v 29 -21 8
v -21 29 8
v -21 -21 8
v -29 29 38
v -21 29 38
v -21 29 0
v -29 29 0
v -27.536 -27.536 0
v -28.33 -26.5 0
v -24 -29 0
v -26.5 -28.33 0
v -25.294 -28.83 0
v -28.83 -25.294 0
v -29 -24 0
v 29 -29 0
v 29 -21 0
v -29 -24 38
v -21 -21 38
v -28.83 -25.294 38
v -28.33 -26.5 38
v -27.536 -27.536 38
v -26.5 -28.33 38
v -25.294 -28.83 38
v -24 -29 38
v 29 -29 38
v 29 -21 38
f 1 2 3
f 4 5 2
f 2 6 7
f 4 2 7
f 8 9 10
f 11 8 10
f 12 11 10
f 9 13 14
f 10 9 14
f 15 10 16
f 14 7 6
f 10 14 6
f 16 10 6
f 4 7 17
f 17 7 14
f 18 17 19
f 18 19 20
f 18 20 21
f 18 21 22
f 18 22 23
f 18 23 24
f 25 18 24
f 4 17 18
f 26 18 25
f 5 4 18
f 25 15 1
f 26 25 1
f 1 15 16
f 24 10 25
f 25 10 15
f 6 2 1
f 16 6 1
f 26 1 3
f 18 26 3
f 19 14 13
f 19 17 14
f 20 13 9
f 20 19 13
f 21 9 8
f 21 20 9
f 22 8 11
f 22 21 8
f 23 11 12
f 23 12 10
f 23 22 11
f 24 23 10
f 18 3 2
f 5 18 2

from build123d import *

# Parameters (mm, degrees)
F0_W     = 58
F0_H     = 58
F1_DEPTH = 8
F3_DEPTH = 30
F5_DEPTH = 8.001
F6_R     = 5


with BuildPart() as f1:
    # F0 (on Top) → F1 (new body)
    with BuildSketch(Plane.XY):
        Rectangle(F0_W, F0_H)
    extrude(amount=F1_DEPTH)

    # F2 (on face) → F3 (join)
    with BuildSketch(Plane.XY.offset(8)):
        Polygon((-29, 29), (-29, -29), (29, -29), (29, -21), (-21, -21), (-21, 29), align=None)
    extrude(amount=F3_DEPTH)

    # F4 (on face) → F5 (cut, through all)
    with BuildSketch(Plane.XY.offset(8)):
        Polygon((29, 29), (-21, 29), (29, -21), align=None)
    extrude(amount=-F5_DEPTH, mode=Mode.SUBTRACT)

    # F6
    f6_edges = [f1.edges().sort_by_distance(p)[0] for p in [
        (-29, -29, 19),
    ]]
    fillet(f6_edges, radius=F6_R)


solid = f1.part
